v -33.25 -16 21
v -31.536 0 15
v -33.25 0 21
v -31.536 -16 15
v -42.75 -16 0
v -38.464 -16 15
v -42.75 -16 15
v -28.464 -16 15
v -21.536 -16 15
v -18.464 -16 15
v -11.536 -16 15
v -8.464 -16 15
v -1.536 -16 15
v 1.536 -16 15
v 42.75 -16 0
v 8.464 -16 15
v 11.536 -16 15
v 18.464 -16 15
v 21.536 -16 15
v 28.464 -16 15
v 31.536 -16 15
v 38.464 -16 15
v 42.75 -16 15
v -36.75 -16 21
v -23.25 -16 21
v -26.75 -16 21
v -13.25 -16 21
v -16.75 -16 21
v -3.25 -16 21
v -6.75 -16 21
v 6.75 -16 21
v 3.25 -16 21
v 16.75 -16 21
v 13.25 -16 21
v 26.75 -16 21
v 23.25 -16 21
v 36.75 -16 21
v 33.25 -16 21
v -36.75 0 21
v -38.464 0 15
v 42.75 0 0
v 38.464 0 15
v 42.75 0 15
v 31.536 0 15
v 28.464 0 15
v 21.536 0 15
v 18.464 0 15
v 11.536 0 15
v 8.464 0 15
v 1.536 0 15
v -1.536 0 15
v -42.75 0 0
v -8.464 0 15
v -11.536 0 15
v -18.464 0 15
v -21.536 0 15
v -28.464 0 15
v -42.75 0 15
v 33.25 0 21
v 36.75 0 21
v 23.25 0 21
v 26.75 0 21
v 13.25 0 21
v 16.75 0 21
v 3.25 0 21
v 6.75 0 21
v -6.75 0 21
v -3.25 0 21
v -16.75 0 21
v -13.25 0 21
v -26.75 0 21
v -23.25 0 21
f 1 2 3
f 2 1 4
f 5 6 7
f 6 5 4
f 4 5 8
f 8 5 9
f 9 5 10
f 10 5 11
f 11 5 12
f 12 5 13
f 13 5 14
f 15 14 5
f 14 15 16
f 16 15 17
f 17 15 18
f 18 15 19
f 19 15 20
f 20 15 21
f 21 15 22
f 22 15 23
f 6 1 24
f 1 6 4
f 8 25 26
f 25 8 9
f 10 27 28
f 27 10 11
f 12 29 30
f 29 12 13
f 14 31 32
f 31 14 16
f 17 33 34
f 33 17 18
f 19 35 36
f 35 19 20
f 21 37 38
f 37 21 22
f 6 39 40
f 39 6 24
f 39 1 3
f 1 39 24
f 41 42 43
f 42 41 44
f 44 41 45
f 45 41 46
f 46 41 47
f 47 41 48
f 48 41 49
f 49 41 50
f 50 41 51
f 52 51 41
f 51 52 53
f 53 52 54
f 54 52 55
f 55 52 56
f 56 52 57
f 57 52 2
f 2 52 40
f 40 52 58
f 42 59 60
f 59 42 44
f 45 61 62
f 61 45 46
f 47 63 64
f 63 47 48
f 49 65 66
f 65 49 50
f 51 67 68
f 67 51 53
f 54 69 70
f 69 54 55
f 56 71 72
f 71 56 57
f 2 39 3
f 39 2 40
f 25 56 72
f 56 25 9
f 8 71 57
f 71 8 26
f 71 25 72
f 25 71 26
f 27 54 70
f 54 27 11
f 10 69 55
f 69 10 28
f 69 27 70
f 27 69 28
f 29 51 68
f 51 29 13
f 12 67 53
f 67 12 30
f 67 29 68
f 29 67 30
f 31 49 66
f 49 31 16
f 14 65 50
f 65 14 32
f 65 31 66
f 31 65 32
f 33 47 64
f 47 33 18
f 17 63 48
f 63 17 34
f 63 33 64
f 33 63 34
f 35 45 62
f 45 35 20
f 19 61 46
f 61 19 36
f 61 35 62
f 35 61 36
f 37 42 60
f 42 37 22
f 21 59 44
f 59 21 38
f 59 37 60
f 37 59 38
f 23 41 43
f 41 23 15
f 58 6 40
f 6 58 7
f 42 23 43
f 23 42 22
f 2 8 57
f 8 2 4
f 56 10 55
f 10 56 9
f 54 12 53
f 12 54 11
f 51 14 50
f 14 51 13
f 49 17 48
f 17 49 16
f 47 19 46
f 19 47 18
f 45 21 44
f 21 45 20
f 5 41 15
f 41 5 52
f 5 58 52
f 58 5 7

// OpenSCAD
$fn = 32;

// ----------------------------------------------------------------------
// Toothed rack, 8 teeth
// 10 mm pitch, 6 mm teeth
// ----------------------------------------------------------------------

// --- parameters (mm) ---
bar_w = 16;     // bar width (Y)
bar_h = 15;     // bar height (Z)
teeth = 8;      // number of teeth
pitch = 10;     // tooth pitch
tooth_h = 6;    // tooth height above the bar
root_w = 7.5;   // tooth width at the root
crest_w = 3.5;  // tooth width at the crest

// --- derived feature positions (mm) ---
span = (teeth - 1) * pitch;  // = 70   distance between the outer teeth
bar_l = span + root_w + 8;   // = 85.5   bar length: teeth plus 4 mm at each end
tooth_x = -span / 2;         // = -35   X of the first tooth
height = bar_h + tooth_h;    // = 21   overall height
feature_centers = [
  [tooth_x + 0 * pitch, -bar_w / 2],
  [tooth_x + 1 * pitch, -bar_w / 2],
  [tooth_x + 2 * pitch, -bar_w / 2],
  [tooth_x + 3 * pitch, -bar_w / 2],
  [tooth_x + 4 * pitch, -bar_w / 2],
  [tooth_x + 5 * pitch, -bar_w / 2],
  [tooth_x + 6 * pitch, -bar_w / 2],
  [tooth_x + 7 * pitch, -bar_w / 2]
];   // tooth centre line, drives the tooth loop

// bar with a rack of teeth, one extruded trapezoium per centre
module rack_tooth() {
  linear_extrude(height = bar_w)
    polygon(points = [
      [0, 0],
      [root_w, 0],
      [root_w / 2 + crest_w / 2, tooth_h + 1],
      [root_w / 2 - crest_w / 2, tooth_h + 1]
    ]);
}

union() {
  translate([-bar_l / 2, -bar_w, 0]) cube([bar_l, bar_w, bar_h]);
  for (centre = feature_centers)
    translate([centre[0] - root_w / 2, 0, bar_h - 1]) rotate([90, 0, 0]) rack_tooth();
}
